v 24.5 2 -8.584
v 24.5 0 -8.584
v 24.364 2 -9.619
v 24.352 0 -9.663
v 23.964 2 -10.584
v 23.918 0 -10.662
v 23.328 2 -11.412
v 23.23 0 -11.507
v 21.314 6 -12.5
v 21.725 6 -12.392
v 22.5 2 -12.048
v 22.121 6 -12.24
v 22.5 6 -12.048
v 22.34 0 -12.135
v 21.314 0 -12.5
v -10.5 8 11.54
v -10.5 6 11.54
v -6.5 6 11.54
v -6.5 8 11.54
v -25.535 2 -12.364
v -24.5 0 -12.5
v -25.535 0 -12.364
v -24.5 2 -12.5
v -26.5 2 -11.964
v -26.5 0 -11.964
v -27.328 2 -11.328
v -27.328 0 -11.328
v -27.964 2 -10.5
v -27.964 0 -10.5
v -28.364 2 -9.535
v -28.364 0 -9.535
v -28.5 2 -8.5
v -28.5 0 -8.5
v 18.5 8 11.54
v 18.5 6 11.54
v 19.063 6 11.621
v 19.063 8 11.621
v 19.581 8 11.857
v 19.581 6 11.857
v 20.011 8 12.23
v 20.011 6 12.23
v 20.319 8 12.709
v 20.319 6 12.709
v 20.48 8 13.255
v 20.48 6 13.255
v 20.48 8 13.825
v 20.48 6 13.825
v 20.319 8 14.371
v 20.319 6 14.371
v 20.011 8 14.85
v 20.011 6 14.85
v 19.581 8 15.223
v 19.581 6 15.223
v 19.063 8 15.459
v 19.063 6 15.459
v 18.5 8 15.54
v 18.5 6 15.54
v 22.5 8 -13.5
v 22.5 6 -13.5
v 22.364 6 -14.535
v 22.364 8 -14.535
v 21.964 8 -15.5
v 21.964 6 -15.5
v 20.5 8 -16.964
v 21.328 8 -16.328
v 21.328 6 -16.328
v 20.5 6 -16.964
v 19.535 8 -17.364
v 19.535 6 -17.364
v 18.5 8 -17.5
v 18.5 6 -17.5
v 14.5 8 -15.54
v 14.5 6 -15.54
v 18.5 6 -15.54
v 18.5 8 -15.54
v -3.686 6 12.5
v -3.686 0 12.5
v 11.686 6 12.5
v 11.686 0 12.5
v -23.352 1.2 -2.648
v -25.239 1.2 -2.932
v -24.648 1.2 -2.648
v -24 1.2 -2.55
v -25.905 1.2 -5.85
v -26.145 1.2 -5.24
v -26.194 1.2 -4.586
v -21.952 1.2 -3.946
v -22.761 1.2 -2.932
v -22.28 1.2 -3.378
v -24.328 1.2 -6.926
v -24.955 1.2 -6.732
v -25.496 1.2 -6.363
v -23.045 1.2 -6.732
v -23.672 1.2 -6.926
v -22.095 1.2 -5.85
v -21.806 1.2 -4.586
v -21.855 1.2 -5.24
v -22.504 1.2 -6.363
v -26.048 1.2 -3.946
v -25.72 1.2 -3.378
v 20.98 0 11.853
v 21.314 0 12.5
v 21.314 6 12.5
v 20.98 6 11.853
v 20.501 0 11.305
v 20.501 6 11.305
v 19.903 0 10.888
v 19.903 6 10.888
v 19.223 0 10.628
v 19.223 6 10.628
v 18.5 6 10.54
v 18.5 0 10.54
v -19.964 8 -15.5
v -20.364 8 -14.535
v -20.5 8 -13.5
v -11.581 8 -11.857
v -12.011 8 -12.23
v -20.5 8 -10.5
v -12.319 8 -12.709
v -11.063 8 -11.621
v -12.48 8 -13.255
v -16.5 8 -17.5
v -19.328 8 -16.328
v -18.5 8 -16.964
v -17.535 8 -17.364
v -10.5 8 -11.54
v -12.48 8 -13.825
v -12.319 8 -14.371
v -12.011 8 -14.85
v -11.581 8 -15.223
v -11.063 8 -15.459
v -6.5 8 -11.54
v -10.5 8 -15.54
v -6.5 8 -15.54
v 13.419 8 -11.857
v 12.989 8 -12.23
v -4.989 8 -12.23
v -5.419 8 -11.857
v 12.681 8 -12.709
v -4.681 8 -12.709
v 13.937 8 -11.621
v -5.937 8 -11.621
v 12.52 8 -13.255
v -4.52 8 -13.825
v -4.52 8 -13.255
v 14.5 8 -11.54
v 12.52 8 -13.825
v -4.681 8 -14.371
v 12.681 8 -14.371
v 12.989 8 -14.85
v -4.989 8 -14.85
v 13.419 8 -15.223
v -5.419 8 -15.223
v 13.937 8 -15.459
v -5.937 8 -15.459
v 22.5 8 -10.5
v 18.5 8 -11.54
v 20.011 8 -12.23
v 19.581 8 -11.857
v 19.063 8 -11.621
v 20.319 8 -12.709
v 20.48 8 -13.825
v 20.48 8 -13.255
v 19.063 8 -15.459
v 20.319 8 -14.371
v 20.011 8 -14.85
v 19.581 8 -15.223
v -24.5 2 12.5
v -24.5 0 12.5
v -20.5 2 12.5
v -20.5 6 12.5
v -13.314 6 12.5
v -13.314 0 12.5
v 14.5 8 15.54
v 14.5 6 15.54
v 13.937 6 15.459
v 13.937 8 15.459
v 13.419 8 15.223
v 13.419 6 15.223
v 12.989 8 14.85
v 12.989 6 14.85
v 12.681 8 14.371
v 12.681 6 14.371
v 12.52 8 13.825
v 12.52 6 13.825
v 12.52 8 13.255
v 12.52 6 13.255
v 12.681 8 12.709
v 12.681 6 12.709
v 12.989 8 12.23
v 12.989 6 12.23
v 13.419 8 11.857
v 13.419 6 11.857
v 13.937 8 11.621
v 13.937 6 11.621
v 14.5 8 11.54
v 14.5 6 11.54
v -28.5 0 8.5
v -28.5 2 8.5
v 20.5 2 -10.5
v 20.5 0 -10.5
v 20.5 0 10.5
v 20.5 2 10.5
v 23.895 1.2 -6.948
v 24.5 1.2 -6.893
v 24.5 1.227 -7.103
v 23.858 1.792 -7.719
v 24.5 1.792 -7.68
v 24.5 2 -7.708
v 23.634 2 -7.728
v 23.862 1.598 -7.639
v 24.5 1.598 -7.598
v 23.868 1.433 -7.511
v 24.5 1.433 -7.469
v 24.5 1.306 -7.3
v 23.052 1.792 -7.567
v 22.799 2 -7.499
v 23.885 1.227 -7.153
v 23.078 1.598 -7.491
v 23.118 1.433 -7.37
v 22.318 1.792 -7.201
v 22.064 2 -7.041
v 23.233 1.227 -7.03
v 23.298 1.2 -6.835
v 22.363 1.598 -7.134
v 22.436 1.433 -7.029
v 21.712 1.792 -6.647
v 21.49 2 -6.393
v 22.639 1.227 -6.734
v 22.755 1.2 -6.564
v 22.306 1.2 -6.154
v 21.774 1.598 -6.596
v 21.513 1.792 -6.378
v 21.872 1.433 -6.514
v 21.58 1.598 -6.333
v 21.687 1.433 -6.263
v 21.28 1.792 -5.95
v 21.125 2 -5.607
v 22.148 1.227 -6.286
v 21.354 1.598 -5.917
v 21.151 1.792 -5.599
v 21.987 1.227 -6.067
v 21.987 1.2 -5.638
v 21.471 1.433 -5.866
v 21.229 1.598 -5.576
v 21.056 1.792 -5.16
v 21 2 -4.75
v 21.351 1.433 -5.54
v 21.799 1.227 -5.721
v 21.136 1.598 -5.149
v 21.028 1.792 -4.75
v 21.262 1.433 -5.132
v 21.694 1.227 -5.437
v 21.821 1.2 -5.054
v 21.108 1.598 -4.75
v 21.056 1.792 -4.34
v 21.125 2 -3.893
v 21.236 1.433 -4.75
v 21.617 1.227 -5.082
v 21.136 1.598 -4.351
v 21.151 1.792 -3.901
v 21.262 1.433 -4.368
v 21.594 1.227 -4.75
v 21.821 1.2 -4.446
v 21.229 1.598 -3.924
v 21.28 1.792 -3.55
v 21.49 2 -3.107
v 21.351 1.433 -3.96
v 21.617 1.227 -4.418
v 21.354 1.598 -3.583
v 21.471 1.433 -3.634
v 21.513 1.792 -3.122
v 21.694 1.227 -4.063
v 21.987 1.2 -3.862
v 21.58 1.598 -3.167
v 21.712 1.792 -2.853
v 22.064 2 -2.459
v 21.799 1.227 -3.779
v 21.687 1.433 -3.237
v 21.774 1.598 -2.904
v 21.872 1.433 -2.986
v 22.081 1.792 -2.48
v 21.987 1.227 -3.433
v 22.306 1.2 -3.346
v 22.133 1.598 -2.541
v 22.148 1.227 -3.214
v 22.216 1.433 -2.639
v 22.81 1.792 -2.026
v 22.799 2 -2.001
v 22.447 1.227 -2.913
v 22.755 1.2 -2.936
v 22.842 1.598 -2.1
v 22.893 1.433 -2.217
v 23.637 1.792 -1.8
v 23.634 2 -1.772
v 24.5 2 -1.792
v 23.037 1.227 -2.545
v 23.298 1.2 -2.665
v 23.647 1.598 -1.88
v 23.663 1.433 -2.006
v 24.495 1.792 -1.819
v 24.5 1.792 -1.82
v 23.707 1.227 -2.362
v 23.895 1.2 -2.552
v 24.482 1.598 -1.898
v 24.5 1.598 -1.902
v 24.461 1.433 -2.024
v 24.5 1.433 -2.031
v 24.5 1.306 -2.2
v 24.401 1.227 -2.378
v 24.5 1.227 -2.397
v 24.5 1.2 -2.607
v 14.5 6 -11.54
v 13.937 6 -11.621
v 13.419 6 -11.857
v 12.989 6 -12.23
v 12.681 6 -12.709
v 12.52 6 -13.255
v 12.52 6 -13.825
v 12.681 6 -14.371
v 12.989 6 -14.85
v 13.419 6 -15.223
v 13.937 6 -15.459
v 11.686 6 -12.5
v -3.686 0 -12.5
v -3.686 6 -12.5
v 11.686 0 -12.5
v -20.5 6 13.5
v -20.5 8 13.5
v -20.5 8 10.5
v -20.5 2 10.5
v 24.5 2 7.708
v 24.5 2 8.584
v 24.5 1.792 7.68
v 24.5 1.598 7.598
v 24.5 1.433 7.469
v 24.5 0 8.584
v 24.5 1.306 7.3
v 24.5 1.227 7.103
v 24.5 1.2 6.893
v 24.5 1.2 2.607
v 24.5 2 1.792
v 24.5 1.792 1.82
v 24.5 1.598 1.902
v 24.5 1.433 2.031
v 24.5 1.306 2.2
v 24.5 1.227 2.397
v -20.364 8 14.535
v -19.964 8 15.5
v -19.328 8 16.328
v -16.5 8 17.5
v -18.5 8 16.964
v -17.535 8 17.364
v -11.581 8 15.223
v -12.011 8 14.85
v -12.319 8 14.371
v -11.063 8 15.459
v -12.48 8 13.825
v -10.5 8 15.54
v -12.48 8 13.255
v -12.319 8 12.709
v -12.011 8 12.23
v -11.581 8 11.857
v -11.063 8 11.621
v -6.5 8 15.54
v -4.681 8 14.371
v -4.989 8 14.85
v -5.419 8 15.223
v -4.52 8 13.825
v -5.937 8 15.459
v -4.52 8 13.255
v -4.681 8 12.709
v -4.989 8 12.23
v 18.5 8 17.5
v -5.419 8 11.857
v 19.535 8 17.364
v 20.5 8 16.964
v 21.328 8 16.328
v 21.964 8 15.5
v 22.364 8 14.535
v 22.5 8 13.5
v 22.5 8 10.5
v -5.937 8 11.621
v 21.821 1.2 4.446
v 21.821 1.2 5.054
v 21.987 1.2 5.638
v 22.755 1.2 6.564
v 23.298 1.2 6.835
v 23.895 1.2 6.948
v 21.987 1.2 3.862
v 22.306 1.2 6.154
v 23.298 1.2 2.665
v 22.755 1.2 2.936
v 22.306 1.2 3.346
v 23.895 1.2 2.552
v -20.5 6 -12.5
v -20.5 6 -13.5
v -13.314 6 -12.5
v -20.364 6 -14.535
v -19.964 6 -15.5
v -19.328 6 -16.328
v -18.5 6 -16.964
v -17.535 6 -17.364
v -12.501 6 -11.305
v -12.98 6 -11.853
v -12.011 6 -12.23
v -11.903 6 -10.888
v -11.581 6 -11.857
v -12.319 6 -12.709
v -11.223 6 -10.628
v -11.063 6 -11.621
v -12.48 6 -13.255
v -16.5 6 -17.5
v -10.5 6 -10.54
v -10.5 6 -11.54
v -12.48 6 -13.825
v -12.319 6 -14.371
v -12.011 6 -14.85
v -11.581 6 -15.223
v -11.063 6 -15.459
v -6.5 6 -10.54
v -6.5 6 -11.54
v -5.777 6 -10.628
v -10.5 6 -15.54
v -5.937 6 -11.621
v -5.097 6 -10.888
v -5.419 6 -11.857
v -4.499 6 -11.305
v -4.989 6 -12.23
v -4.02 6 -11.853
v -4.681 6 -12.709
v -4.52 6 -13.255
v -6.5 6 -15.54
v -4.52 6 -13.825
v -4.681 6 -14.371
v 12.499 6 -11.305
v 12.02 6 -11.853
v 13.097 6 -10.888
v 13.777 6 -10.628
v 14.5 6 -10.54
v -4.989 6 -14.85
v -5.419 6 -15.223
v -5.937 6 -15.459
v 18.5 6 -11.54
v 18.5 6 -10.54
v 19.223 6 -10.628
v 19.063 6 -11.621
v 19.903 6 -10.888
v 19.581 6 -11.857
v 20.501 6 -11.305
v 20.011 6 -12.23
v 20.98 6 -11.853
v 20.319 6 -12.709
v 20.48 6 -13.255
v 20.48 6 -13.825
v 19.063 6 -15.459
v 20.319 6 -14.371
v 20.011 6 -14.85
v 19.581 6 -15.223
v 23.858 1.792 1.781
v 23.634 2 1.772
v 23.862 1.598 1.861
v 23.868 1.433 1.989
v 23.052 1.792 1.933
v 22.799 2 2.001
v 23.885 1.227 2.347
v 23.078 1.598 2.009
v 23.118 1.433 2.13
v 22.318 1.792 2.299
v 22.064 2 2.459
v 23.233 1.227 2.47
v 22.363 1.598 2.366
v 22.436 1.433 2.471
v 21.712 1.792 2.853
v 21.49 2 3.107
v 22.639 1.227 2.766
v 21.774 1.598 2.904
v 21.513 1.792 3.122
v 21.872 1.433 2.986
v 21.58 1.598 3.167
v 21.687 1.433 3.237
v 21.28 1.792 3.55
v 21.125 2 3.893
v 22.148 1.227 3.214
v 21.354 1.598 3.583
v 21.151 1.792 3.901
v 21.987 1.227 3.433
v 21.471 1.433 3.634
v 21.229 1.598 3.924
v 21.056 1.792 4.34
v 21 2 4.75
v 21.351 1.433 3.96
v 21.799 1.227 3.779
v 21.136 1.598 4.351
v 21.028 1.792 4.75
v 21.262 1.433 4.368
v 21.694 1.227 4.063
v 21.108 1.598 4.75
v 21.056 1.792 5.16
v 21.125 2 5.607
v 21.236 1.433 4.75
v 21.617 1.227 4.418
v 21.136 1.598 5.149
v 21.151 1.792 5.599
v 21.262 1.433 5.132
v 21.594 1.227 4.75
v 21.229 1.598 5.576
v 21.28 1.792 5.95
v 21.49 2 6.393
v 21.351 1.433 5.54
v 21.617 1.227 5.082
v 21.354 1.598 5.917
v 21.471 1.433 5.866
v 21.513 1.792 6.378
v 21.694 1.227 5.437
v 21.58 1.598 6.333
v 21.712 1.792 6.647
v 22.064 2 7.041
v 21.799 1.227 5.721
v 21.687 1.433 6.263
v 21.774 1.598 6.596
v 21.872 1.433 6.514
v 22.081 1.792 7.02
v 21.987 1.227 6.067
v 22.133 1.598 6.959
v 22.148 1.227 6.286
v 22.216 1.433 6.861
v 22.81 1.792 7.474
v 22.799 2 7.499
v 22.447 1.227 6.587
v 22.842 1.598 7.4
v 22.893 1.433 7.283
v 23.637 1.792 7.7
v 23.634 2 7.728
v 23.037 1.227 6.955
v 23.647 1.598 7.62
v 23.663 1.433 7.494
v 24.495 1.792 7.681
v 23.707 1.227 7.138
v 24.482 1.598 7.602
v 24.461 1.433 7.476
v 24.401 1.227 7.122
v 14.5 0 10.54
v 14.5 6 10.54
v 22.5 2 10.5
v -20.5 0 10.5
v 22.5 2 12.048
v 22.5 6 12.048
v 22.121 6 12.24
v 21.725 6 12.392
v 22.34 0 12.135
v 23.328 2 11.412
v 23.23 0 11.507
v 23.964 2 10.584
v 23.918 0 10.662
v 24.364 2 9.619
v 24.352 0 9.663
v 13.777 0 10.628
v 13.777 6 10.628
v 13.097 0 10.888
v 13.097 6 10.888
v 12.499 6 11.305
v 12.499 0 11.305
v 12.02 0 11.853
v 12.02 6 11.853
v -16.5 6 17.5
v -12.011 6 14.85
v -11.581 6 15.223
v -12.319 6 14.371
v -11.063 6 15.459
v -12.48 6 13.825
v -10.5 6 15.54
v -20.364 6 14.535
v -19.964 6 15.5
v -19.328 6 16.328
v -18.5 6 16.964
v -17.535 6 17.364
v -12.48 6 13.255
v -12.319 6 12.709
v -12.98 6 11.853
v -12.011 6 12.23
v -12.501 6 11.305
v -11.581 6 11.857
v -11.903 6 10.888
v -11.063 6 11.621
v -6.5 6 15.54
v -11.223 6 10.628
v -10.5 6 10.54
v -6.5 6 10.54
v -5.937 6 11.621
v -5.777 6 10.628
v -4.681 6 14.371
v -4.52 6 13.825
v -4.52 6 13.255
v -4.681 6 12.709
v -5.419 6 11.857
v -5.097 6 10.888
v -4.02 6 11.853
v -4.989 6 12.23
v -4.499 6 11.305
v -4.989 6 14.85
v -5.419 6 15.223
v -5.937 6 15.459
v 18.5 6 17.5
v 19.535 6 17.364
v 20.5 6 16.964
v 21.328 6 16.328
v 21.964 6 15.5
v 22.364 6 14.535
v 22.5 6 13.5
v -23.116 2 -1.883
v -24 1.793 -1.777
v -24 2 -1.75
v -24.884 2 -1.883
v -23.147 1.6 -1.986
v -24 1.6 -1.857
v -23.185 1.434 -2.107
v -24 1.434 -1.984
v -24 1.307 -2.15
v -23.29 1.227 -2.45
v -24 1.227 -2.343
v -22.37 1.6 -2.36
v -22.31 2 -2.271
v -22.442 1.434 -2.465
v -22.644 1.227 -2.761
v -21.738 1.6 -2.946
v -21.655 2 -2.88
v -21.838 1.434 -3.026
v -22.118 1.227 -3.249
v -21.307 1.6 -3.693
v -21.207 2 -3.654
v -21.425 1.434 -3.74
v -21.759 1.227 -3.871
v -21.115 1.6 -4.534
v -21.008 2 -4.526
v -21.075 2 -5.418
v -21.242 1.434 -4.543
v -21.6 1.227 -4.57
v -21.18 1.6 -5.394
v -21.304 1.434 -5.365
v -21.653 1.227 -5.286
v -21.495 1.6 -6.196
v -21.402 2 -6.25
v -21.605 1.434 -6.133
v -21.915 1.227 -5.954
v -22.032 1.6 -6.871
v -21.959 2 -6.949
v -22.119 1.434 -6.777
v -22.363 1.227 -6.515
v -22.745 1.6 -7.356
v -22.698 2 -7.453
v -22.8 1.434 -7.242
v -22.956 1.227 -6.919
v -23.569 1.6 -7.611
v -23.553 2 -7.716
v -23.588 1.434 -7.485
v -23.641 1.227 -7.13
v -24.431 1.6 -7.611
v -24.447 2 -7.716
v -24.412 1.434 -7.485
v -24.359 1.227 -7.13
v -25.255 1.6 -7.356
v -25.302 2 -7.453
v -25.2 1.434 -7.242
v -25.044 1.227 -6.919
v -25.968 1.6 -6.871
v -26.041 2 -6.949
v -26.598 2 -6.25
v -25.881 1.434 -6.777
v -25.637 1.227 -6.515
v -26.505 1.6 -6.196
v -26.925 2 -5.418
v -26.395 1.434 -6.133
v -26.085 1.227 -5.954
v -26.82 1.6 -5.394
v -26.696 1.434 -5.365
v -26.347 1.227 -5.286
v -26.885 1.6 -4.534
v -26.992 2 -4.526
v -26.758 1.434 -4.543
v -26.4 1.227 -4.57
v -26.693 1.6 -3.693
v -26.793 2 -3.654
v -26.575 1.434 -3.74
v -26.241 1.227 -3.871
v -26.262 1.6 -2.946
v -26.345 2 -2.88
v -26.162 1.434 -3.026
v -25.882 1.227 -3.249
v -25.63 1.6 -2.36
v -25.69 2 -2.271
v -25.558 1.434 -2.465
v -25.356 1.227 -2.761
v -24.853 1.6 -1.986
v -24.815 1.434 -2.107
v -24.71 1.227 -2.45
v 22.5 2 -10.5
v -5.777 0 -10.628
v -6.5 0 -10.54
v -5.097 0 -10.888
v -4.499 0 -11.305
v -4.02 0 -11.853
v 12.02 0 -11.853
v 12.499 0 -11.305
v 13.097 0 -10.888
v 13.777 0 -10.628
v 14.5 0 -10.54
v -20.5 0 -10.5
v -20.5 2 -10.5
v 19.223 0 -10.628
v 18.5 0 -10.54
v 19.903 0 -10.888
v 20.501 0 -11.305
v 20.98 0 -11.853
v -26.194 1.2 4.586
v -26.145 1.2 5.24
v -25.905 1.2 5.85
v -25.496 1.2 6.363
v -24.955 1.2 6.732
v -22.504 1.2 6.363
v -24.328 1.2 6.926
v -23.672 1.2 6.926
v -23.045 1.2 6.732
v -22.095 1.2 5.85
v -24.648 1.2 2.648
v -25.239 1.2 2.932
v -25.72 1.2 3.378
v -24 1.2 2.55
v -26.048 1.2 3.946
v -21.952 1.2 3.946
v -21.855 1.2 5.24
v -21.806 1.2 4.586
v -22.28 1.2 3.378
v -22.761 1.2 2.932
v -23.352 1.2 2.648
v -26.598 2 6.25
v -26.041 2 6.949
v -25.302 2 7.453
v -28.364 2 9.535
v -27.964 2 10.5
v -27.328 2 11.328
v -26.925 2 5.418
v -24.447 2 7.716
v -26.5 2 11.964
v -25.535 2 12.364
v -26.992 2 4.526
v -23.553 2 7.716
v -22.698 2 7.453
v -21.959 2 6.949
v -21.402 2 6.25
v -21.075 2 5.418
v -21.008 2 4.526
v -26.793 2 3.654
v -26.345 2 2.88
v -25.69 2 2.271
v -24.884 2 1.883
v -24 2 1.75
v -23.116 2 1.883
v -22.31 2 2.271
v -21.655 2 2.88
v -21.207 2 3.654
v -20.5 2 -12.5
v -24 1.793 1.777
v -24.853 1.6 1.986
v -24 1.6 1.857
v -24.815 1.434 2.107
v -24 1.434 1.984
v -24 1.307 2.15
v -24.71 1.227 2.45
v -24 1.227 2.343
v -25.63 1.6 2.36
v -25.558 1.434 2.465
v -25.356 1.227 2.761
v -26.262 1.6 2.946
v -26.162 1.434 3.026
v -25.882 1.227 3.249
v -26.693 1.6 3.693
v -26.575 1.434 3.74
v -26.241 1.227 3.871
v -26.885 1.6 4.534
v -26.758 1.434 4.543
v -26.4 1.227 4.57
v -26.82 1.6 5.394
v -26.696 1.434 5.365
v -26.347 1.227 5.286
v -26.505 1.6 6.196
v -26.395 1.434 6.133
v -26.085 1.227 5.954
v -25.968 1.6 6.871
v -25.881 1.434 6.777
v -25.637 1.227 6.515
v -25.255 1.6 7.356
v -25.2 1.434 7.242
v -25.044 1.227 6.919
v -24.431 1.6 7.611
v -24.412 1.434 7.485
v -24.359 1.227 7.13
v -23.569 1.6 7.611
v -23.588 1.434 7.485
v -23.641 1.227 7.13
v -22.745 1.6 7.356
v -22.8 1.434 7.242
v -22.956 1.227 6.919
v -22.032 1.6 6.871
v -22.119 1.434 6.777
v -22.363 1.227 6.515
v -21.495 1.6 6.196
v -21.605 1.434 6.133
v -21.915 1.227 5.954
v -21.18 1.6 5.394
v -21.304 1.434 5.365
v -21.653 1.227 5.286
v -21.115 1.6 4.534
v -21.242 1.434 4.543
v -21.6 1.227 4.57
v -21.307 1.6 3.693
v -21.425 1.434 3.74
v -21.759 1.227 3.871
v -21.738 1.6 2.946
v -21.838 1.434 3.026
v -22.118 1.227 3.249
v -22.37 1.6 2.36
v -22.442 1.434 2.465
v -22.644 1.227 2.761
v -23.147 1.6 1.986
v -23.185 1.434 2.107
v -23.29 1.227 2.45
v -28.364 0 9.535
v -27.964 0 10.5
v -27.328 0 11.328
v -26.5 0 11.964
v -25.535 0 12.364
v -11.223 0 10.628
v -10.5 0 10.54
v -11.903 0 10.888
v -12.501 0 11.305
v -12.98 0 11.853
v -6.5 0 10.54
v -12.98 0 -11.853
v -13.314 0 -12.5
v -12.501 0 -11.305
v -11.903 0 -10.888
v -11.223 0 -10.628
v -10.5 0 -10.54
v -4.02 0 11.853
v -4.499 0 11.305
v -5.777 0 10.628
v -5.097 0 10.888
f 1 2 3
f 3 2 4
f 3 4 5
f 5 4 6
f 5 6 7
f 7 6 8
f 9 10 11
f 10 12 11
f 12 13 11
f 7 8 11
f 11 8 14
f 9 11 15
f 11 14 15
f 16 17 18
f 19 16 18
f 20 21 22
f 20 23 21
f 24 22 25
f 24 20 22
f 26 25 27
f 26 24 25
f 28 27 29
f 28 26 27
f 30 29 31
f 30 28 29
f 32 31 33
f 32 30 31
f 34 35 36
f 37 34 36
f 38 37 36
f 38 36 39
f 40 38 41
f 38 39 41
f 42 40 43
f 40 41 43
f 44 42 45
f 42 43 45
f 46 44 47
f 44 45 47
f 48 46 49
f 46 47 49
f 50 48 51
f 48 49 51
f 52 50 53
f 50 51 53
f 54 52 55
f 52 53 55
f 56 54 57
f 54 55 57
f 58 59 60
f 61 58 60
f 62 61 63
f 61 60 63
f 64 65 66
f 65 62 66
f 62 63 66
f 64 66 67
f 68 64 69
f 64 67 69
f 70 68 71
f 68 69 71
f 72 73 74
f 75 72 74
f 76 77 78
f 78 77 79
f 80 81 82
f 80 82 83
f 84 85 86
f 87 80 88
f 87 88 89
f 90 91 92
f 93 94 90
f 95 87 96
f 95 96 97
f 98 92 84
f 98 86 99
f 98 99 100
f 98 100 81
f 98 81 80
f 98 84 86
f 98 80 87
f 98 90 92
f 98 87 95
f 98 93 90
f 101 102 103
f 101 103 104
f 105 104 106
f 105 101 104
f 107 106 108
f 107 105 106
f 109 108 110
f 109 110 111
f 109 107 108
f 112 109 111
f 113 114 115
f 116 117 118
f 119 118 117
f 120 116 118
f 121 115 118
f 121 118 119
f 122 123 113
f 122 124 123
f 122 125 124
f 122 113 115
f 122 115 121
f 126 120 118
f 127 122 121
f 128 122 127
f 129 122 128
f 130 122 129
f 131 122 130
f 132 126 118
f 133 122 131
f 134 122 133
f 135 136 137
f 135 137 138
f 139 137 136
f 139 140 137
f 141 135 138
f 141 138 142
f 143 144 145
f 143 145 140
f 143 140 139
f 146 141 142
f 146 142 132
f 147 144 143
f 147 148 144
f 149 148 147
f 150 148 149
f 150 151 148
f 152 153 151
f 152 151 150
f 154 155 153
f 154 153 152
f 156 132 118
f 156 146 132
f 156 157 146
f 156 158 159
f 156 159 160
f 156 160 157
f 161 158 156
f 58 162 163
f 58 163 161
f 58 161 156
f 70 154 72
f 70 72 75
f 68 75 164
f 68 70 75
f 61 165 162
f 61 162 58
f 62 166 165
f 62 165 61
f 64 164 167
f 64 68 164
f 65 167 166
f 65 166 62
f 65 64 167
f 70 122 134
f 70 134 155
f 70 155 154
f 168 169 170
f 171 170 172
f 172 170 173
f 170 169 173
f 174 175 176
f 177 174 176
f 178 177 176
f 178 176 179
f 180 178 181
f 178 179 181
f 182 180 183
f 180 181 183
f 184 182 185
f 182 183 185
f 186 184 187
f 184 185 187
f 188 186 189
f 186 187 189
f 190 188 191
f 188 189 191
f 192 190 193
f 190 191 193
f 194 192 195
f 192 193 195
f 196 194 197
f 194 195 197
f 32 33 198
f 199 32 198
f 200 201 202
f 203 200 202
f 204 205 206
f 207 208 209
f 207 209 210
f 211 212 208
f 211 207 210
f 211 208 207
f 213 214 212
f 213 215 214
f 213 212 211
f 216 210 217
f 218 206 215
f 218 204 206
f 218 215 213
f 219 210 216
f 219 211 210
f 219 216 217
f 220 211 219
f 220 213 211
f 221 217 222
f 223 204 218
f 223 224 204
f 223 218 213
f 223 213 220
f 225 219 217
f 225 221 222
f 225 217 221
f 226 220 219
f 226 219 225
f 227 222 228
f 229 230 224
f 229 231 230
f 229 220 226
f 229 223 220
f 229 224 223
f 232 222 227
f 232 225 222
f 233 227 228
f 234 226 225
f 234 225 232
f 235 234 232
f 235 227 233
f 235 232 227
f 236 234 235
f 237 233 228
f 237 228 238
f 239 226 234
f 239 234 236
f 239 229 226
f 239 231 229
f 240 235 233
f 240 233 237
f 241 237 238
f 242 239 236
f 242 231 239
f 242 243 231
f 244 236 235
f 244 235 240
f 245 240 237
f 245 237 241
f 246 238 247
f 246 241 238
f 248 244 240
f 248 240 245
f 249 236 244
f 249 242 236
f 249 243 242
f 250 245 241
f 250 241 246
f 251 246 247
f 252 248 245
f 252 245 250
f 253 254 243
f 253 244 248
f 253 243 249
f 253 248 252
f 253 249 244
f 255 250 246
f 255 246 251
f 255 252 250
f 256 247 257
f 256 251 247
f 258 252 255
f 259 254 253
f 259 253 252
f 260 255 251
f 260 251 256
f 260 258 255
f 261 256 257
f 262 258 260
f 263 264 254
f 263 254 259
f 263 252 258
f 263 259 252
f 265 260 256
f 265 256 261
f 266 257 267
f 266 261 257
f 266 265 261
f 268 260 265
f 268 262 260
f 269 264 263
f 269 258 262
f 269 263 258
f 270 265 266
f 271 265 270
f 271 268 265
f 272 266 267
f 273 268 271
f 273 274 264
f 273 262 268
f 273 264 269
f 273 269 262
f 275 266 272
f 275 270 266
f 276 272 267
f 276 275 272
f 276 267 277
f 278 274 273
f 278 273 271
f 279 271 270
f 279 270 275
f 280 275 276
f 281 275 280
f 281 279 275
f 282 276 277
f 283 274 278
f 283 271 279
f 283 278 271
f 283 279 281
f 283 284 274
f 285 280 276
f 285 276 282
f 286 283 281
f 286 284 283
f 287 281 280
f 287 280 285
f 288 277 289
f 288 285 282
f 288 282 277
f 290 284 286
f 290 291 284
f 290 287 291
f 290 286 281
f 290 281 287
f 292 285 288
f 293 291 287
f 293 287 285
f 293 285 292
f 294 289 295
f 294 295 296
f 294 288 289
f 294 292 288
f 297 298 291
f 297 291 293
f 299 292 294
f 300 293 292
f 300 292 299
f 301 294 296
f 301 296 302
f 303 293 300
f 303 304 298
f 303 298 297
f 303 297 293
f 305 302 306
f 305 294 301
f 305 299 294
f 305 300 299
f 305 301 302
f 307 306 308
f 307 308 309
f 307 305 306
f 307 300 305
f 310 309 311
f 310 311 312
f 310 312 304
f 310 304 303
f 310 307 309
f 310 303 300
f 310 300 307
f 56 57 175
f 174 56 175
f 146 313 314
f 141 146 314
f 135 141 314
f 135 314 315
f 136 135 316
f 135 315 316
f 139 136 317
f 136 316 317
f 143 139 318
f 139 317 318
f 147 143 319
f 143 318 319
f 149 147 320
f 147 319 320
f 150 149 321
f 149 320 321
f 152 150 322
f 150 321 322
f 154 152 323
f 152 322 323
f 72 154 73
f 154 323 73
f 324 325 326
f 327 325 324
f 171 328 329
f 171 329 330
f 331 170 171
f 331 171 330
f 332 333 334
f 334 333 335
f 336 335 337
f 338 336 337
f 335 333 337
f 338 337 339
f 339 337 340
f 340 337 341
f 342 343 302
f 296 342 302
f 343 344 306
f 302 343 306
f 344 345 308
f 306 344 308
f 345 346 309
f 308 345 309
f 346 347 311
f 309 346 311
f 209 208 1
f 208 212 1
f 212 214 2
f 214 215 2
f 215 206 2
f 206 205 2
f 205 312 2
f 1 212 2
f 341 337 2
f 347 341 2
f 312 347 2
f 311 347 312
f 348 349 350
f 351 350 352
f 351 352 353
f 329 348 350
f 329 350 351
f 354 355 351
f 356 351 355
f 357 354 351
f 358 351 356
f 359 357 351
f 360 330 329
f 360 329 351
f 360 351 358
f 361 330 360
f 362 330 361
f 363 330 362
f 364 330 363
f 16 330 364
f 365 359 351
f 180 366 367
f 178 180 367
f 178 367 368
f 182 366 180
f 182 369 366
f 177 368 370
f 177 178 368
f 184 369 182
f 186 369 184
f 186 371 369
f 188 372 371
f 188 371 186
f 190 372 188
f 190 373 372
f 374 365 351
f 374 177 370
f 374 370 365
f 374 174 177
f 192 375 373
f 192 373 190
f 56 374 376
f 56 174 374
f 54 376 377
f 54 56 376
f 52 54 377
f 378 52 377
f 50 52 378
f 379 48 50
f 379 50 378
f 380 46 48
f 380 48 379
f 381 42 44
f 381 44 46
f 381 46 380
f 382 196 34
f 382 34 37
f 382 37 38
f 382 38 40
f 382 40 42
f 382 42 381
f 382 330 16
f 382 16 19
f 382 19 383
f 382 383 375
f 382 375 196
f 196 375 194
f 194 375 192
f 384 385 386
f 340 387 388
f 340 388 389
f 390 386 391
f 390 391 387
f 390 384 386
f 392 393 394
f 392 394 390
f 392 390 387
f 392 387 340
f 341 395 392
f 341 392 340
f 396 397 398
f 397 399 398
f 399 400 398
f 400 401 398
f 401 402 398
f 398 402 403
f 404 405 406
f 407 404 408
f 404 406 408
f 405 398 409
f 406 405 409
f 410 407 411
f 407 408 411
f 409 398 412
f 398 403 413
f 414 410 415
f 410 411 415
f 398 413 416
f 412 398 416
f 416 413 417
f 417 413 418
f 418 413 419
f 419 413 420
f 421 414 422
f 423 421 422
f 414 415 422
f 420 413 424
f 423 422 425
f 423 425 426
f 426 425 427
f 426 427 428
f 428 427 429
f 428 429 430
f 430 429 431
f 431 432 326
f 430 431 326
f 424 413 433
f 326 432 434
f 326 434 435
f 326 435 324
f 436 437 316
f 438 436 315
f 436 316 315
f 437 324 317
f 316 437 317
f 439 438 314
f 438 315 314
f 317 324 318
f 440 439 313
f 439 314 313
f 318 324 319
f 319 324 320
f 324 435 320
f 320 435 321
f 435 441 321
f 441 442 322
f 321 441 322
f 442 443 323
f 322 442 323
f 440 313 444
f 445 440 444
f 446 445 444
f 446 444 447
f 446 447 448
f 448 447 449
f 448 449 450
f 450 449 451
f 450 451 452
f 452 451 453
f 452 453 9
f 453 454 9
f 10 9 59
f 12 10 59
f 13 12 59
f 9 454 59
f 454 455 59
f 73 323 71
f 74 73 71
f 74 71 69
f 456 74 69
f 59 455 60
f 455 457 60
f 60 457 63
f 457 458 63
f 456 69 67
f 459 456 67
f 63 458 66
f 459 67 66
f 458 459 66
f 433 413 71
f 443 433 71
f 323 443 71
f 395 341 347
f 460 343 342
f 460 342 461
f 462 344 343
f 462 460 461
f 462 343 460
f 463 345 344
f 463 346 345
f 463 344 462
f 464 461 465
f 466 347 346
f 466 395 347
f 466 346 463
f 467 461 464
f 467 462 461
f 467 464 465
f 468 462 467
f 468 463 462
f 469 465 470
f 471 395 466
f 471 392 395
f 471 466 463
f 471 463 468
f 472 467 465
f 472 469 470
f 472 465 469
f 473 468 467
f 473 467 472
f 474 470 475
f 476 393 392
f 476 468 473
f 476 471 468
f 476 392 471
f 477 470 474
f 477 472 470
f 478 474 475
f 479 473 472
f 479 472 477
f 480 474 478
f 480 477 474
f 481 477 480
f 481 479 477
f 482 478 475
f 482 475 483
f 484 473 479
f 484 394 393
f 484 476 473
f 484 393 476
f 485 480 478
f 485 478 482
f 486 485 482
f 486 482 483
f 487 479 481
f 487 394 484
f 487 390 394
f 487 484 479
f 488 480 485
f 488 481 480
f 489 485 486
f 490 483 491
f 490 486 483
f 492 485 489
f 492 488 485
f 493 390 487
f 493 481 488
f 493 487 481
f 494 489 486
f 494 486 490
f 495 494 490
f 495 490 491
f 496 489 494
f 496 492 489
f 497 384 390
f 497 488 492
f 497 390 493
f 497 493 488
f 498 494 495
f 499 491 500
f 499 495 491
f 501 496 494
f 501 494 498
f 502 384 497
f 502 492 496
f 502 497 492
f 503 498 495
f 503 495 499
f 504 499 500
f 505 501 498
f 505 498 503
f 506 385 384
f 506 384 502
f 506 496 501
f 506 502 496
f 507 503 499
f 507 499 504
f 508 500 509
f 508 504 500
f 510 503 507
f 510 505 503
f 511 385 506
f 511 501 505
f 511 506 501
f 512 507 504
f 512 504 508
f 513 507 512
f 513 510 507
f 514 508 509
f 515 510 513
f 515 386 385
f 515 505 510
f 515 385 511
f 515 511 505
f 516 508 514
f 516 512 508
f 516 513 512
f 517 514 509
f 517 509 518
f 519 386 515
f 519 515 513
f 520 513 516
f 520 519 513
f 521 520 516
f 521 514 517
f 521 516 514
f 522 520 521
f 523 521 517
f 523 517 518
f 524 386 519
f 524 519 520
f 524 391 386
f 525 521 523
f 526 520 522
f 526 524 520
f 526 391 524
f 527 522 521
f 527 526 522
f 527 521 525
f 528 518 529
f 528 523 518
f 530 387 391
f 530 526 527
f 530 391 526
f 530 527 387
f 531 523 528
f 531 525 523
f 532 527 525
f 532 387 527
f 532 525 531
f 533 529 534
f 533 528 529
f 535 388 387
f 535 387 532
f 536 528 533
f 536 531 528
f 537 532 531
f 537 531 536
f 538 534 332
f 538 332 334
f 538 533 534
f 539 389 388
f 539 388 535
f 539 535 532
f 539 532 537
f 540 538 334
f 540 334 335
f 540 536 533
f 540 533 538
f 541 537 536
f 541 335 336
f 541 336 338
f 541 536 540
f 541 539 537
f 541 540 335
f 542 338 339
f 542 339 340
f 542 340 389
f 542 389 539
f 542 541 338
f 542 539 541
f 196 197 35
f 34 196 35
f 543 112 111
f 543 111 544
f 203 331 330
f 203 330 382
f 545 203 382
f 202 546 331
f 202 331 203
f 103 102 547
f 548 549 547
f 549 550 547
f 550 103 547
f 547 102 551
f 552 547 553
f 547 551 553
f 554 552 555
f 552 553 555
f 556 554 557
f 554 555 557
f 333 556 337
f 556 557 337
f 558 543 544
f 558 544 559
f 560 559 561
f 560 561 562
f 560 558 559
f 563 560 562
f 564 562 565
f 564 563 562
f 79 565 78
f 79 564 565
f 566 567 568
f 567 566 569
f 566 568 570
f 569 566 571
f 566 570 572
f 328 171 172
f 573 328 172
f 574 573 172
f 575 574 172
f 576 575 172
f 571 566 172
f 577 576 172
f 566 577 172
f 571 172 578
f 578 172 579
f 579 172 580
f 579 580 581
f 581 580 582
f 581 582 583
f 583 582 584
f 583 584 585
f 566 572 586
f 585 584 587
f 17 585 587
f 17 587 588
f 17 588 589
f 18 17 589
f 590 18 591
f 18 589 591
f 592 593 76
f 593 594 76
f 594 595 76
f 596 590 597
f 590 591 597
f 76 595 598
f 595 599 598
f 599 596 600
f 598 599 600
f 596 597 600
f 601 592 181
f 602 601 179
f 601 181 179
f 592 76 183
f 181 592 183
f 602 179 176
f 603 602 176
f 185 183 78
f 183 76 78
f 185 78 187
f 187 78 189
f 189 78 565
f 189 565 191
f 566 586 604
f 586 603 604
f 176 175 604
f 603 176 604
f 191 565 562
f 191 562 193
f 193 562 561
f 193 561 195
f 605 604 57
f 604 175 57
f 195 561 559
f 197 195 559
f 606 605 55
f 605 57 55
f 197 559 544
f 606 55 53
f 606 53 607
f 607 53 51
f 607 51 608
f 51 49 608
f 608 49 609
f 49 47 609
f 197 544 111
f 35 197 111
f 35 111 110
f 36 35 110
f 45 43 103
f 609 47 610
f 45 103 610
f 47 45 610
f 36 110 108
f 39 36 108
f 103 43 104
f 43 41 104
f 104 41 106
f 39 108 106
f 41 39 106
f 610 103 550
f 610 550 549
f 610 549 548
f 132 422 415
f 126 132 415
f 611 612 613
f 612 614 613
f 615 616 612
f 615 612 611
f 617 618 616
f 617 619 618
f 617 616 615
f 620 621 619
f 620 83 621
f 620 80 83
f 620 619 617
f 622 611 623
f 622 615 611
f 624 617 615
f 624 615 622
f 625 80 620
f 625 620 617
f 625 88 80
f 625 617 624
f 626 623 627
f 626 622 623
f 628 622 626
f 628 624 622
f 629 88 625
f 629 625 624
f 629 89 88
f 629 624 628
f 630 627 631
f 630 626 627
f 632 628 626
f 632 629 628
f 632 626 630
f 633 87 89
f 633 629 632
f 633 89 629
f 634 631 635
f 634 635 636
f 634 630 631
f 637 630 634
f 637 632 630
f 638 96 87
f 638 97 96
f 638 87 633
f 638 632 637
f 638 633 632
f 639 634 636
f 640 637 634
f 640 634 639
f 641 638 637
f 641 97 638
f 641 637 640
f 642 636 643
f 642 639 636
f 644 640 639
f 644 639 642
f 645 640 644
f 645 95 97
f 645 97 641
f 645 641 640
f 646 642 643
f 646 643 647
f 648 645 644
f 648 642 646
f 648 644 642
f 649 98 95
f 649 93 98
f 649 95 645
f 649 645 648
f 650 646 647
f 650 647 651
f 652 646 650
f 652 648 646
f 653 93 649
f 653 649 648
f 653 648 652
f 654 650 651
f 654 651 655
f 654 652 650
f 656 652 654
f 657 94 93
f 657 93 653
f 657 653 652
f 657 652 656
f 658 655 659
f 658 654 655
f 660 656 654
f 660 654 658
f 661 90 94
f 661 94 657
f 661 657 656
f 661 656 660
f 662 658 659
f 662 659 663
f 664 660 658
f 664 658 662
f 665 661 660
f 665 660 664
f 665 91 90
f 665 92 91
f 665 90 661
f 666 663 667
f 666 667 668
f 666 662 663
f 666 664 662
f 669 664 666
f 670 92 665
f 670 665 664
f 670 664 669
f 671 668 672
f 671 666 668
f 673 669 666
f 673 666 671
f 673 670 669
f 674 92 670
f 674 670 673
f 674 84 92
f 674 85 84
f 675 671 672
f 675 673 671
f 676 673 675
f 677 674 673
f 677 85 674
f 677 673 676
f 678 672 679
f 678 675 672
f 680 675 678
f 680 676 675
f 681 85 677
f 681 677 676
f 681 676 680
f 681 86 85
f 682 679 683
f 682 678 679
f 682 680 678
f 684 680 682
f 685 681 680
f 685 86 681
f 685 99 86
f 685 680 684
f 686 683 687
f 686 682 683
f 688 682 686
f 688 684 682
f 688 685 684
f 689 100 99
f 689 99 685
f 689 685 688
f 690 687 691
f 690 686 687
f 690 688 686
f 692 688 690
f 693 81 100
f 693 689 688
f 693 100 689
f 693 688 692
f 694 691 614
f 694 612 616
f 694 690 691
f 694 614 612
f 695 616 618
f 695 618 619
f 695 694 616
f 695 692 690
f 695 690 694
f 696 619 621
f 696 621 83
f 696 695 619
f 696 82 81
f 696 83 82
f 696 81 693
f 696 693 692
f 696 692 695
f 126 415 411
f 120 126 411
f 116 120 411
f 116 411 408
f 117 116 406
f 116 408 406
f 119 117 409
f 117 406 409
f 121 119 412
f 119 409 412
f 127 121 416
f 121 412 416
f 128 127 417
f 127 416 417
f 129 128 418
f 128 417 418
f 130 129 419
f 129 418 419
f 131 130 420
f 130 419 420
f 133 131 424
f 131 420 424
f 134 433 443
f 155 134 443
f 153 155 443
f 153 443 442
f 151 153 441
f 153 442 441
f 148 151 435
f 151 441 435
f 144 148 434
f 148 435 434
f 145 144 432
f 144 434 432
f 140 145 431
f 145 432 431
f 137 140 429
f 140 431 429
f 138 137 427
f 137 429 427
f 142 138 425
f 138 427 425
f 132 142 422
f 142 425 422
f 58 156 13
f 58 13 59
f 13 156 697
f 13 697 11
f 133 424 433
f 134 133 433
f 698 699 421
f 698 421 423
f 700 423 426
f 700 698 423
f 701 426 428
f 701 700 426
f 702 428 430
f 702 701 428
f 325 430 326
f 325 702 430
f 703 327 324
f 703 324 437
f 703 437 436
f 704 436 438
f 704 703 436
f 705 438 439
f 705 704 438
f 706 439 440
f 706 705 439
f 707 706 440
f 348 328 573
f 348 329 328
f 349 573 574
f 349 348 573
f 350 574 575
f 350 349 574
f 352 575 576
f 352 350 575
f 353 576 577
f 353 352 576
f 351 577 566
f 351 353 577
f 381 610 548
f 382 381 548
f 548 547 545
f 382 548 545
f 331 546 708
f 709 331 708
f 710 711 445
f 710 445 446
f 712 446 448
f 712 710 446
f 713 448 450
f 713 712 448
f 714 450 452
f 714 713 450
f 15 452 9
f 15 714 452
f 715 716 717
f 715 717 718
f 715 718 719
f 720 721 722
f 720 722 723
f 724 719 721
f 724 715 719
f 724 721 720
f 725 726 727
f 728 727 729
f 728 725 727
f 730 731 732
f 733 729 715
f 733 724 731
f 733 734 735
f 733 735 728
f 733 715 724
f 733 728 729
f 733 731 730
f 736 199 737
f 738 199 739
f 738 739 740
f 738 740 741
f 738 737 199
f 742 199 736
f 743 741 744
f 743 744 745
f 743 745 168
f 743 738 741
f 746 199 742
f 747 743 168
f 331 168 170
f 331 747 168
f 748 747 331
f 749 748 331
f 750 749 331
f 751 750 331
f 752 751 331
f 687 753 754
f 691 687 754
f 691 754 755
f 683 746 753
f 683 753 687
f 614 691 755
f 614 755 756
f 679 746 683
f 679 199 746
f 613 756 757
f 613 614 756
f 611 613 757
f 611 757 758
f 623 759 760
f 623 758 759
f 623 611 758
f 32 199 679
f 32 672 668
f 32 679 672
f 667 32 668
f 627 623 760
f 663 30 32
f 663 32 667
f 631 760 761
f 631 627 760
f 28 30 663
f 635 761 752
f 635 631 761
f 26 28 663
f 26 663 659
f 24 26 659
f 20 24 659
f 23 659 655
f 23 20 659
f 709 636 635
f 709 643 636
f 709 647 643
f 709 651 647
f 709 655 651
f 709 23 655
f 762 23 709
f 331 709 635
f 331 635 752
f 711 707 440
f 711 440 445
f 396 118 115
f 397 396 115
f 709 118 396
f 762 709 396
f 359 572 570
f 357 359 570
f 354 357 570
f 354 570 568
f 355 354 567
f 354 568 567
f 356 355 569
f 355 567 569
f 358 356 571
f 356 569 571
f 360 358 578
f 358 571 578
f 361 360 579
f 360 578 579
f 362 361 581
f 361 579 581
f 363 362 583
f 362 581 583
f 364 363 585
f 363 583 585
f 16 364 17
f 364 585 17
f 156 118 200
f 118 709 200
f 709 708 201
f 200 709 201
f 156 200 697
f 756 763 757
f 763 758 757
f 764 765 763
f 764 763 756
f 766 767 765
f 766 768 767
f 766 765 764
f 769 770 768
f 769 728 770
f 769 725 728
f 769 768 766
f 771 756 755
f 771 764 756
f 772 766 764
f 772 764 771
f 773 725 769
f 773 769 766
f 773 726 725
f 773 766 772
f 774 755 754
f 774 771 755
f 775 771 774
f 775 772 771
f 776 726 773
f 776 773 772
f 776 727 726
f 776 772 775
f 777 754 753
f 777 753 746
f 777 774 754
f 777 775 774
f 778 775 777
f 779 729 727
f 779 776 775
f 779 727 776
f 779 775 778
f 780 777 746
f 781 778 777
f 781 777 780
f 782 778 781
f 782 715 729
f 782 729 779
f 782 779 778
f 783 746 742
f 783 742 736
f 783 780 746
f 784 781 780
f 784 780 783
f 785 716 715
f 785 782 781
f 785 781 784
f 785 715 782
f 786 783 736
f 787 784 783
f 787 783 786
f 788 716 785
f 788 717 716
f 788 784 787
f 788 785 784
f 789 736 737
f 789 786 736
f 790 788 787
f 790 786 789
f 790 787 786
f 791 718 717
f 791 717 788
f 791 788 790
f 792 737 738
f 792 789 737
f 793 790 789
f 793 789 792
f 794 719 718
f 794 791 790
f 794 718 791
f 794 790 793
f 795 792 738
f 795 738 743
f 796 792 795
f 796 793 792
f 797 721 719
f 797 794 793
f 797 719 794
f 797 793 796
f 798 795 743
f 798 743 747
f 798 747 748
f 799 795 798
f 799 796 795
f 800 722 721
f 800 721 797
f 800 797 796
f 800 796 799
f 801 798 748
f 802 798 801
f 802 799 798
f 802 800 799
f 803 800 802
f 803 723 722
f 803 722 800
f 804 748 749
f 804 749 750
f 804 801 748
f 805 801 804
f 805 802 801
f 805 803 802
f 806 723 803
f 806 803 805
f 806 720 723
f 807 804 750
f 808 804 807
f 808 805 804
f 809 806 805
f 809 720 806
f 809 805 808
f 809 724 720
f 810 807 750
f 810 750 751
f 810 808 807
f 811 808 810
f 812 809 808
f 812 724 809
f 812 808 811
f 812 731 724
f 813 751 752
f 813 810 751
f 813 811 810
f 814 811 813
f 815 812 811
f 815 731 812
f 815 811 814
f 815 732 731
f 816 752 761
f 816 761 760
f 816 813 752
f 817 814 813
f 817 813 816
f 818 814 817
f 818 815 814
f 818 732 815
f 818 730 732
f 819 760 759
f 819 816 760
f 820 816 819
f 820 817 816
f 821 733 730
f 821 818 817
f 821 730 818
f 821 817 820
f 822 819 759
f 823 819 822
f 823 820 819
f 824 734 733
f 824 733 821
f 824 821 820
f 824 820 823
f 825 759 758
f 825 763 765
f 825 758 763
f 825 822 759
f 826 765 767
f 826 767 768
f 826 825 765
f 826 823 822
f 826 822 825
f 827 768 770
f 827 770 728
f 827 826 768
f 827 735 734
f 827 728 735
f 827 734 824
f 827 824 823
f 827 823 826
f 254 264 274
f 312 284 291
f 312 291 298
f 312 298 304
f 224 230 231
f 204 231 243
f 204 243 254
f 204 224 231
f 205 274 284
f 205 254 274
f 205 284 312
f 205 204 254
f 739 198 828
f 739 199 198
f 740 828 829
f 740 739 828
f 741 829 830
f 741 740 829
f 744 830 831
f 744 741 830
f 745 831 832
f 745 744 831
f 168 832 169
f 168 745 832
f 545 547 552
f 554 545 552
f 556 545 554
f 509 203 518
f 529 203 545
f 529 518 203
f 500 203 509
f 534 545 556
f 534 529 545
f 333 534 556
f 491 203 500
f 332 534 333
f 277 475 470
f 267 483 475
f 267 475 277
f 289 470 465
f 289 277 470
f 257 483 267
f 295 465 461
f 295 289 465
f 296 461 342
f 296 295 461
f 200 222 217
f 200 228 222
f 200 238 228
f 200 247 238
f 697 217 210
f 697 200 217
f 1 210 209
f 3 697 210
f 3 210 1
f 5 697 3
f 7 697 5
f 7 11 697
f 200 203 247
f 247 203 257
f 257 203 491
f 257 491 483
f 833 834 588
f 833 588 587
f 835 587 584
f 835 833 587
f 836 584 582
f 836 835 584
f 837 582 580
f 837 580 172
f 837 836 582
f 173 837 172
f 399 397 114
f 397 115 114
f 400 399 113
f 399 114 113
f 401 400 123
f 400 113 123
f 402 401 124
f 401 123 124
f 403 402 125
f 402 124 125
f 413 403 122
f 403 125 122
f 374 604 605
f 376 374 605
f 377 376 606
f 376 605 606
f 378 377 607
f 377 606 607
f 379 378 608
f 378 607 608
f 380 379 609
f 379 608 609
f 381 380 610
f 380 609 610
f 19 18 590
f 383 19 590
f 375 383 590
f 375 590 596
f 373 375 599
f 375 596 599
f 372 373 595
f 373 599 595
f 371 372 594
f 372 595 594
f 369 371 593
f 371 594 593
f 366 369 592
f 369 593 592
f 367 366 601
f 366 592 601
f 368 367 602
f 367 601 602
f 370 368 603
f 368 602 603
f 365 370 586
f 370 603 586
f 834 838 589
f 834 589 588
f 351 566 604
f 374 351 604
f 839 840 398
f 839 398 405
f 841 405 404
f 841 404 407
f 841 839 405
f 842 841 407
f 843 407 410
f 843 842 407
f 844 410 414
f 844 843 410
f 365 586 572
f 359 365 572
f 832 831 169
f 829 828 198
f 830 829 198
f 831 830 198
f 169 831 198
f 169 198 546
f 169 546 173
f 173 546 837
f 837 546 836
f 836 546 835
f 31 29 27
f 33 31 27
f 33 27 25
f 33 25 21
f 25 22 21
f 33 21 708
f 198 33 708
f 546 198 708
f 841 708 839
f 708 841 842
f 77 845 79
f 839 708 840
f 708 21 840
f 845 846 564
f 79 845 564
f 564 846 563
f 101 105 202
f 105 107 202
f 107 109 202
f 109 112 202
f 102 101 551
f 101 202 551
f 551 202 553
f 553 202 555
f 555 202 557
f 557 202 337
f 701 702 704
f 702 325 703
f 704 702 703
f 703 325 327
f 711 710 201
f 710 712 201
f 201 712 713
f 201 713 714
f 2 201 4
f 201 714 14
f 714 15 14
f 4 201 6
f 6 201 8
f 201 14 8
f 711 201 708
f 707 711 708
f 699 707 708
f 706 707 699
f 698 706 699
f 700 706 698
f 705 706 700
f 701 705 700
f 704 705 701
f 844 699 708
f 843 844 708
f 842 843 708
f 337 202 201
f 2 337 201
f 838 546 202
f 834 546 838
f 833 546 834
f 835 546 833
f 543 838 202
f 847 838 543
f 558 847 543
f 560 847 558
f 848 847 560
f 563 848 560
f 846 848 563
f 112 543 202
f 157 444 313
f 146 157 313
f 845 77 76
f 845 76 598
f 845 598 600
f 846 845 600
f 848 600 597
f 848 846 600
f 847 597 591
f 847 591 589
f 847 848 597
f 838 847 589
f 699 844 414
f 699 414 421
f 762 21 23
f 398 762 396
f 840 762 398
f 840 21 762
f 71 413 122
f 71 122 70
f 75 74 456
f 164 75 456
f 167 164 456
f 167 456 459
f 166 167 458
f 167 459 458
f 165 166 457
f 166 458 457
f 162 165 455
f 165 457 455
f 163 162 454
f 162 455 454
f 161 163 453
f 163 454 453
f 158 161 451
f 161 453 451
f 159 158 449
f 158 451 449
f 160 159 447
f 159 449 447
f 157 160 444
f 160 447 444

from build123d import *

# Parameters (mm, degrees)
EXTRUDE_2_DEPTH     = 2
CUT_EXTRUDE_2_DEPTH = 0.8
FILLET_1_R          = 0.8
SKETCH_6_W          = 43
SKETCH_6_H          = 2
SKETCH_6_H_2        = 1.9999999999999947
EXTRUDE_3_DEPTH     = 4
SKETCH_7_W          = 43
SKETCH_7_H          = 6.999999999999998
EXTRUDE_4_DEPTH     = 2
CUT_EXTRUDE_3_DEPTH = 35.3874977280988
CUT_EXTRUDE_5_DEPTH = 6
FILLET_2_R          = 4
FILLET_3_R          = 4
FILLET_4_R          = 4


# Some blends are built 0.0001 mm under size
with BuildPart() as part:
    # 草图4 → 凸台-拉伸2 (new body)
    with BuildSketch(Plane(origin=(0, 0, 0), x_dir=(1, 0, 0), z_dir=(0, 1, 0))):
        Polygon((24.499999999999996, -12.499999999999993), (24.499999999999996, 10.5), (24.499999999999996, 12.5), (-24.500000000000004, 12.5), (-28.500000000000004, 12.5), (-28.500000000000004, -12.499999999999993), (-24.500000000000004, -12.499999999999993), align=None)
        Polygon((-20.500000000000004, 10.500000000000002), (20.499999999999996, 10.5), (20.500000000000004, -10.5), (-20.5, -10.499999999999998), align=None, mode=Mode.SUBTRACT)
    extrude(amount=EXTRUDE_2_DEPTH)

    # 草图5 → 切除-拉伸2 (cut)
    with BuildSketch(Plane(origin=(0, 2, 0), x_dir=(1, 0, 0), z_dir=(0, 1, 0))):
        with BuildLine():
            Line((-24.000000000000004, 1.7499999999999991), (-24.000000000000004, 4.75))
            Line((-24.000000000000004, 4.75), (-21.000000000000004, 4.75))
            ThreePointArc((-21.000000000000004, 4.75), (-26.121320343559606, 6.871320343559683), (-24.000000000000117, 1.7499999999999991))
        make_face()
        with BuildLine():
            Line((-21.000000000000004, 4.75), (-24.000000000000004, 4.75))
            Line((-24.000000000000004, 4.75), (-24.000000000000004, 1.7499999999999991))
            ThreePointArc((-24.000000000000117, 1.7499999999999991), (-21.8786796564404, 2.6286796564403168), (-21.000000000000004, 4.749999999999999))
        make_face()
        with BuildLine():
            ThreePointArc((-21.000000000000007, -4.75), (-21.8786796564404, -2.6286796564403203), (-24.000000000000114, -1.7500000000000027))
            Line((-24.000000000000004, -1.7500000000000027), (-24.000000000000004, -4.75))
            Line((-24.000000000000004, -4.75), (-21.000000000000007, -4.75))
        make_face()
        with BuildLine():
            Line((-24.000000000000004, -4.75), (-24.000000000000004, -1.7500000000000027))
            ThreePointArc((-24.000000000000114, -1.7500000000000027), (-26.121320343559606, -6.871320343559679), (-21.000000000000007, -4.750000000000001))
            Line((-21.000000000000007, -4.75), (-24.000000000000004, -4.75))
        make_face()
        with BuildLine():
            Line((23.999999999999996, 4.75), (20.999999999999996, 4.75))
            ThreePointArc((21, 4.75), (21.878679656440315, 2.628679656440399), (23.999999999999883, 1.7500000000000027))
            Line((23.999999999999996, 1.7500000000000027), (23.999999999999996, 4.75))
        make_face()
        with BuildLine():
            ThreePointArc((24.50000000000003, 7.7080398915498), (22.063508326896304, 7.041287847477928), (21, 4.75))
            Line((20.999999999999996, 4.75), (23.999999999999996, 4.75))
            Line((23.999999999999996, 4.75), (23.999999999999996, 1.7500000000000027))
            ThreePointArc((23.999999999999883, 1.7500000000000027), (24.250878780839006, 1.760508431635119), (24.500000000000025, 1.7919601084501995))
            Line((24.499999999999996, 1.7919601084502048), (24.499999999999996, 7.708039891549795))
        make_face()
        with BuildLine():
            ThreePointArc((24.500000000000025, -1.7919601084501955), (24.25087878083901, -1.7605084316351154), (23.99999999999989, -1.7499999999999991))
            Line((24, -1.7499999999999991), (24, -4.75))
            Line((23.999999999999996, -4.75), (20.999999999999996, -4.75))
            ThreePointArc((21, -4.75), (22.0635083268963, -7.041287847477928), (24.50000000000002, -7.708039891549806))
            Line((24.499999999999996, -7.7080398915498005), (24.499999999999996, -1.7919601084501995))
        make_face()
        with BuildLine():
            Line((24, -4.75), (24, -1.7499999999999991))
            ThreePointArc((23.99999999999989, -1.7499999999999991), (21.87867965644032, -2.6286796564403963), (21, -4.75))
            Line((20.999999999999996, -4.75), (23.999999999999996, -4.75))
        make_face()
    extrude(amount=-CUT_EXTRUDE_2_DEPTH, mode=Mode.SUBTRACT)

    # 圆角1
    fillet_1_edges = [part.edges().sort_by_distance(p)[0] for p in [
        (21.000000000000117, 1.2, 4.749999999999868),
        (21, 1.2, -4.75),
        (-26.999999999999993, 1.2, 4.749999999999993),
        (-23.99999999999989, 1.2, -7.749999999999999),
    ]]
    fillet(fillet_1_edges, radius=FILLET_1_R - 0.0001)  # a hair under: the kernel refuses the full size

    # 草图6 → 凸台-拉伸3 (add)
    with BuildSketch(Plane(origin=(0, 2, 0), x_dir=(1, 0, 0), z_dir=(0, 1, 0))):
        with Locations((0.9999999999999947, 11.500000000000002)):
            Rectangle(SKETCH_6_W, SKETCH_6_H)
        with Locations((0.9999999999999982, -11.499999999999996)):
            Rectangle(SKETCH_6_W, SKETCH_6_H_2)
    extrude(amount=EXTRUDE_3_DEPTH)

    # 草图7 → 凸台-拉伸4 (add)
    with BuildSketch(Plane(origin=(0, 6, 0), x_dir=(1, 0, 0), z_dir=(0, 1, 0))):
        with Locations((0.9999999999999947, 14)):
            Rectangle(SKETCH_7_W, SKETCH_7_H)
        with Locations((0.9999999999999982, -13.999999999999996)):
            Rectangle(SKETCH_7_W, SKETCH_7_H)
    extrude(amount=EXTRUDE_4_DEPTH)

    # 草图8 → 切除-拉伸3 (cut, through all)
    with BuildSketch(Plane.XZ):
        with BuildLine():
            ThreePointArc((-10.5, -11.54), (-12.5, -13.54), (-10.5, -15.54))
            Line((-10.5, -15.54), (-6.500000000000001, -15.54))
            ThreePointArc((-6.500000000000001, -15.54), (-4.500000000000001, -13.54), (-6.500000000000001, -11.54))
            Line((-6.500000000000001, -11.54), (-10.5, -11.54))
        make_face()
        with BuildLine():
            ThreePointArc((14.5, -11.54), (12.5, -13.54), (14.5, -15.54))
            Line((14.5, -15.54), (18.500000000000004, -15.54))
            ThreePointArc((18.500000000000004, -15.54), (20.500000000000004, -13.54), (18.500000000000004, -11.54))
            Line((18.500000000000004, -11.54), (14.5, -11.54))
        make_face()
        with BuildLine():
            Line((-10.500000000000096, 11.54), (-6.500000000000095, 11.54))
            ThreePointArc((-6.500000000000095, 11.54), (-4.500000000000095, 13.54), (-6.500000000000095, 15.54))
            Line((-6.500000000000095, 15.54), (-10.500000000000096, 15.54))
            ThreePointArc((-10.500000000000096, 15.54), (-12.500000000000096, 13.54), (-10.500000000000096, 11.54))
        make_face()
        with BuildLine():
            Line((14.499999999999908, 11.54), (18.499999999999904, 11.54))
            ThreePointArc((18.499999999999904, 11.540000000000001), (20.499999999999904, 13.540000000000001), (18.499999999999904, 15.540000000000001))
            Line((18.499999999999904, 15.54), (14.499999999999908, 15.54))
            ThreePointArc((14.499999999999908, 15.54), (12.499999999999908, 13.54), (14.499999999999908, 11.54))
        make_face()
    extrude(amount=-CUT_EXTRUDE_3_DEPTH, mode=Mode.SUBTRACT)

    # 草图9 → 切除-拉伸5 (cut)
    with BuildSketch(Plane.XZ):
        with BuildLine():
            Line((14.5, -10.540000000000001), (18.500000000000004, -10.54))
            ThreePointArc((18.500000000000004, -10.54), (21.500000000000004, -13.54), (18.500000000000004, -16.54))
            Line((18.500000000000004, -16.54), (14.5, -16.54))
            ThreePointArc((14.5, -16.54), (11.500000000000002, -13.54), (14.5, -10.540000000000001))
        make_face()
        with BuildLine():
            Line((-10.5, -10.540000000000177), (-6.499999999999999, -10.540000000000175))
            ThreePointArc((-6.499999999999999, -10.540000000000175), (-3.500000000000001, -13.540000000000175), (-6.499999999999999, -16.540000000000173))
            Line((-6.499999999999999, -16.540000000000173), (-10.5, -16.540000000000173))
            ThreePointArc((-10.5, -16.540000000000173), (-13.499999999999998, -13.540000000000175), (-10.5, -10.540000000000177))
        make_face()
        with BuildLine():
            Line((-10.500000000000094, 16.539999999999825), (-6.500000000000092, 16.539999999999825))
            ThreePointArc((-6.500000000000092, 16.539999999999825), (-3.5000000000000924, 13.539999999999827), (-6.500000000000092, 10.539999999999827))
            Line((-6.500000000000092, 10.539999999999827), (-10.500000000000094, 10.539999999999827))
            ThreePointArc((-10.500000000000094, 10.539999999999827), (-13.500000000000092, 13.539999999999827), (-10.500000000000094, 16.539999999999825))
        make_face()
        with BuildLine():
            Line((14.499999999999906, 16.54), (18.499999999999908, 16.54))
            ThreePointArc((18.499999999999908, 16.54), (21.499999999999908, 13.54), (18.499999999999908, 10.540000000000001))
            Line((18.499999999999908, 10.540000000000001), (14.499999999999906, 10.540000000000001))
            ThreePointArc((14.499999999999906, 10.540000000000001), (11.499999999999906, 13.54), (14.499999999999906, 16.54))
        make_face()
    extrude(amount=-CUT_EXTRUDE_5_DEPTH, mode=Mode.SUBTRACT)

    # 圆角2
    # the kernel refuses this fillet: 4 mm, written as the material it takes off along each edge
    with BuildSketch(Plane(origin=(24.499999999999996, -9.790767556640994, 12.499999999999993), x_dir=(0, 0, -1), z_dir=(0, 1, 0))) as fillet_2_piece_1_section:
        with BuildLine():
            CenterArc((3.9163070226563974, 4), FILLET_2_R, 191.74119504503736, 78.25880495496267)
            Line((6.39666e-12, 3.186034826087571), (0, 0))
            Line((0, 0), (3.9163070226563974, 0))
        make_face()
    fillet_2_piece_1 = extrude(amount=21.581535113281987, mode=Mode.PRIVATE)
    fillet_2_piece_1 = split(fillet_2_piece_1, bisect_by=Plane(origin=(23.971029818368024, 6, 10.5876929773436), z_dir=(0, -1, 0)), keep=Keep.TOP, mode=Mode.PRIVATE)
    add(fillet_2_piece_1, mode=Mode.SUBTRACT)
    with BuildSketch(Plane(origin=(24.499999999999996, -9.790767556640994, -12.5), x_dir=(0, 0, 1), z_dir=(0, 1, 0))) as fillet_2_piece_2_section:
        with BuildLine():
            CenterArc((3.9163070226563974, -4), FILLET_2_R, 90, 78.25880495496122)
            Line((6.4162e-12, -3.186034826087475), (0, 0))
            Line((0, 0), (3.9163070226563974, 0))
        make_face()
    fillet_2_piece_2 = extrude(amount=21.581535113281987, mode=Mode.PRIVATE)
    fillet_2_piece_2 = split(fillet_2_piece_2, bisect_by=Plane(origin=(23.97102981836802, 6, -10.58769297734361), z_dir=(0, -1, 0)), keep=Keep.TOP, mode=Mode.PRIVATE)
    add(fillet_2_piece_2, mode=Mode.SUBTRACT)
    with BuildSketch(Plane(origin=(22.499999999999993, -4, -17.5), x_dir=(-1, 0, 0), z_dir=(0, 1, 0))) as fillet_2_piece_3:
        with BuildLine():
            CenterArc((FILLET_2_R, FILLET_2_R), FILLET_2_R, 180, 90)
            Line((0, FILLET_2_R), (0, 0))
            Line((0, 0), (FILLET_2_R, 0))
        make_face()
    extrude(amount=22, mode=Mode.SUBTRACT)
    with BuildSketch(Plane(origin=(22.499999999999996, -4, 17.499999999999996), x_dir=(-1, 0, 0), z_dir=(0, 1, 0))) as fillet_2_piece_4:
        with BuildLine():
            CenterArc((FILLET_2_R, -FILLET_2_R), FILLET_2_R, 90, 90)
            Line((0, -FILLET_2_R), (0, 0))
            Line((0, 0), (FILLET_2_R, 0))
        make_face()
    extrude(amount=22, mode=Mode.SUBTRACT)

    # 圆角3
    fillet_3_edges = [part.edges().sort_by_distance(p)[0] for p in [
        (-28.500000000000004, 1, 12.499999999999993),
        (-28.500000000000004, 1, -12.5),
    ]]
    fillet(fillet_3_edges, radius=FILLET_3_R)

    # 圆角4
    fillet_4_edges = [part.edges().sort_by_distance(p)[0] for p in [
        (-20.5, 7, 17.499999999999996),
        (-20.500000000000004, 7, -17.5),
    ]]
    fillet(fillet_4_edges, radius=FILLET_4_R)


solid = part.part
